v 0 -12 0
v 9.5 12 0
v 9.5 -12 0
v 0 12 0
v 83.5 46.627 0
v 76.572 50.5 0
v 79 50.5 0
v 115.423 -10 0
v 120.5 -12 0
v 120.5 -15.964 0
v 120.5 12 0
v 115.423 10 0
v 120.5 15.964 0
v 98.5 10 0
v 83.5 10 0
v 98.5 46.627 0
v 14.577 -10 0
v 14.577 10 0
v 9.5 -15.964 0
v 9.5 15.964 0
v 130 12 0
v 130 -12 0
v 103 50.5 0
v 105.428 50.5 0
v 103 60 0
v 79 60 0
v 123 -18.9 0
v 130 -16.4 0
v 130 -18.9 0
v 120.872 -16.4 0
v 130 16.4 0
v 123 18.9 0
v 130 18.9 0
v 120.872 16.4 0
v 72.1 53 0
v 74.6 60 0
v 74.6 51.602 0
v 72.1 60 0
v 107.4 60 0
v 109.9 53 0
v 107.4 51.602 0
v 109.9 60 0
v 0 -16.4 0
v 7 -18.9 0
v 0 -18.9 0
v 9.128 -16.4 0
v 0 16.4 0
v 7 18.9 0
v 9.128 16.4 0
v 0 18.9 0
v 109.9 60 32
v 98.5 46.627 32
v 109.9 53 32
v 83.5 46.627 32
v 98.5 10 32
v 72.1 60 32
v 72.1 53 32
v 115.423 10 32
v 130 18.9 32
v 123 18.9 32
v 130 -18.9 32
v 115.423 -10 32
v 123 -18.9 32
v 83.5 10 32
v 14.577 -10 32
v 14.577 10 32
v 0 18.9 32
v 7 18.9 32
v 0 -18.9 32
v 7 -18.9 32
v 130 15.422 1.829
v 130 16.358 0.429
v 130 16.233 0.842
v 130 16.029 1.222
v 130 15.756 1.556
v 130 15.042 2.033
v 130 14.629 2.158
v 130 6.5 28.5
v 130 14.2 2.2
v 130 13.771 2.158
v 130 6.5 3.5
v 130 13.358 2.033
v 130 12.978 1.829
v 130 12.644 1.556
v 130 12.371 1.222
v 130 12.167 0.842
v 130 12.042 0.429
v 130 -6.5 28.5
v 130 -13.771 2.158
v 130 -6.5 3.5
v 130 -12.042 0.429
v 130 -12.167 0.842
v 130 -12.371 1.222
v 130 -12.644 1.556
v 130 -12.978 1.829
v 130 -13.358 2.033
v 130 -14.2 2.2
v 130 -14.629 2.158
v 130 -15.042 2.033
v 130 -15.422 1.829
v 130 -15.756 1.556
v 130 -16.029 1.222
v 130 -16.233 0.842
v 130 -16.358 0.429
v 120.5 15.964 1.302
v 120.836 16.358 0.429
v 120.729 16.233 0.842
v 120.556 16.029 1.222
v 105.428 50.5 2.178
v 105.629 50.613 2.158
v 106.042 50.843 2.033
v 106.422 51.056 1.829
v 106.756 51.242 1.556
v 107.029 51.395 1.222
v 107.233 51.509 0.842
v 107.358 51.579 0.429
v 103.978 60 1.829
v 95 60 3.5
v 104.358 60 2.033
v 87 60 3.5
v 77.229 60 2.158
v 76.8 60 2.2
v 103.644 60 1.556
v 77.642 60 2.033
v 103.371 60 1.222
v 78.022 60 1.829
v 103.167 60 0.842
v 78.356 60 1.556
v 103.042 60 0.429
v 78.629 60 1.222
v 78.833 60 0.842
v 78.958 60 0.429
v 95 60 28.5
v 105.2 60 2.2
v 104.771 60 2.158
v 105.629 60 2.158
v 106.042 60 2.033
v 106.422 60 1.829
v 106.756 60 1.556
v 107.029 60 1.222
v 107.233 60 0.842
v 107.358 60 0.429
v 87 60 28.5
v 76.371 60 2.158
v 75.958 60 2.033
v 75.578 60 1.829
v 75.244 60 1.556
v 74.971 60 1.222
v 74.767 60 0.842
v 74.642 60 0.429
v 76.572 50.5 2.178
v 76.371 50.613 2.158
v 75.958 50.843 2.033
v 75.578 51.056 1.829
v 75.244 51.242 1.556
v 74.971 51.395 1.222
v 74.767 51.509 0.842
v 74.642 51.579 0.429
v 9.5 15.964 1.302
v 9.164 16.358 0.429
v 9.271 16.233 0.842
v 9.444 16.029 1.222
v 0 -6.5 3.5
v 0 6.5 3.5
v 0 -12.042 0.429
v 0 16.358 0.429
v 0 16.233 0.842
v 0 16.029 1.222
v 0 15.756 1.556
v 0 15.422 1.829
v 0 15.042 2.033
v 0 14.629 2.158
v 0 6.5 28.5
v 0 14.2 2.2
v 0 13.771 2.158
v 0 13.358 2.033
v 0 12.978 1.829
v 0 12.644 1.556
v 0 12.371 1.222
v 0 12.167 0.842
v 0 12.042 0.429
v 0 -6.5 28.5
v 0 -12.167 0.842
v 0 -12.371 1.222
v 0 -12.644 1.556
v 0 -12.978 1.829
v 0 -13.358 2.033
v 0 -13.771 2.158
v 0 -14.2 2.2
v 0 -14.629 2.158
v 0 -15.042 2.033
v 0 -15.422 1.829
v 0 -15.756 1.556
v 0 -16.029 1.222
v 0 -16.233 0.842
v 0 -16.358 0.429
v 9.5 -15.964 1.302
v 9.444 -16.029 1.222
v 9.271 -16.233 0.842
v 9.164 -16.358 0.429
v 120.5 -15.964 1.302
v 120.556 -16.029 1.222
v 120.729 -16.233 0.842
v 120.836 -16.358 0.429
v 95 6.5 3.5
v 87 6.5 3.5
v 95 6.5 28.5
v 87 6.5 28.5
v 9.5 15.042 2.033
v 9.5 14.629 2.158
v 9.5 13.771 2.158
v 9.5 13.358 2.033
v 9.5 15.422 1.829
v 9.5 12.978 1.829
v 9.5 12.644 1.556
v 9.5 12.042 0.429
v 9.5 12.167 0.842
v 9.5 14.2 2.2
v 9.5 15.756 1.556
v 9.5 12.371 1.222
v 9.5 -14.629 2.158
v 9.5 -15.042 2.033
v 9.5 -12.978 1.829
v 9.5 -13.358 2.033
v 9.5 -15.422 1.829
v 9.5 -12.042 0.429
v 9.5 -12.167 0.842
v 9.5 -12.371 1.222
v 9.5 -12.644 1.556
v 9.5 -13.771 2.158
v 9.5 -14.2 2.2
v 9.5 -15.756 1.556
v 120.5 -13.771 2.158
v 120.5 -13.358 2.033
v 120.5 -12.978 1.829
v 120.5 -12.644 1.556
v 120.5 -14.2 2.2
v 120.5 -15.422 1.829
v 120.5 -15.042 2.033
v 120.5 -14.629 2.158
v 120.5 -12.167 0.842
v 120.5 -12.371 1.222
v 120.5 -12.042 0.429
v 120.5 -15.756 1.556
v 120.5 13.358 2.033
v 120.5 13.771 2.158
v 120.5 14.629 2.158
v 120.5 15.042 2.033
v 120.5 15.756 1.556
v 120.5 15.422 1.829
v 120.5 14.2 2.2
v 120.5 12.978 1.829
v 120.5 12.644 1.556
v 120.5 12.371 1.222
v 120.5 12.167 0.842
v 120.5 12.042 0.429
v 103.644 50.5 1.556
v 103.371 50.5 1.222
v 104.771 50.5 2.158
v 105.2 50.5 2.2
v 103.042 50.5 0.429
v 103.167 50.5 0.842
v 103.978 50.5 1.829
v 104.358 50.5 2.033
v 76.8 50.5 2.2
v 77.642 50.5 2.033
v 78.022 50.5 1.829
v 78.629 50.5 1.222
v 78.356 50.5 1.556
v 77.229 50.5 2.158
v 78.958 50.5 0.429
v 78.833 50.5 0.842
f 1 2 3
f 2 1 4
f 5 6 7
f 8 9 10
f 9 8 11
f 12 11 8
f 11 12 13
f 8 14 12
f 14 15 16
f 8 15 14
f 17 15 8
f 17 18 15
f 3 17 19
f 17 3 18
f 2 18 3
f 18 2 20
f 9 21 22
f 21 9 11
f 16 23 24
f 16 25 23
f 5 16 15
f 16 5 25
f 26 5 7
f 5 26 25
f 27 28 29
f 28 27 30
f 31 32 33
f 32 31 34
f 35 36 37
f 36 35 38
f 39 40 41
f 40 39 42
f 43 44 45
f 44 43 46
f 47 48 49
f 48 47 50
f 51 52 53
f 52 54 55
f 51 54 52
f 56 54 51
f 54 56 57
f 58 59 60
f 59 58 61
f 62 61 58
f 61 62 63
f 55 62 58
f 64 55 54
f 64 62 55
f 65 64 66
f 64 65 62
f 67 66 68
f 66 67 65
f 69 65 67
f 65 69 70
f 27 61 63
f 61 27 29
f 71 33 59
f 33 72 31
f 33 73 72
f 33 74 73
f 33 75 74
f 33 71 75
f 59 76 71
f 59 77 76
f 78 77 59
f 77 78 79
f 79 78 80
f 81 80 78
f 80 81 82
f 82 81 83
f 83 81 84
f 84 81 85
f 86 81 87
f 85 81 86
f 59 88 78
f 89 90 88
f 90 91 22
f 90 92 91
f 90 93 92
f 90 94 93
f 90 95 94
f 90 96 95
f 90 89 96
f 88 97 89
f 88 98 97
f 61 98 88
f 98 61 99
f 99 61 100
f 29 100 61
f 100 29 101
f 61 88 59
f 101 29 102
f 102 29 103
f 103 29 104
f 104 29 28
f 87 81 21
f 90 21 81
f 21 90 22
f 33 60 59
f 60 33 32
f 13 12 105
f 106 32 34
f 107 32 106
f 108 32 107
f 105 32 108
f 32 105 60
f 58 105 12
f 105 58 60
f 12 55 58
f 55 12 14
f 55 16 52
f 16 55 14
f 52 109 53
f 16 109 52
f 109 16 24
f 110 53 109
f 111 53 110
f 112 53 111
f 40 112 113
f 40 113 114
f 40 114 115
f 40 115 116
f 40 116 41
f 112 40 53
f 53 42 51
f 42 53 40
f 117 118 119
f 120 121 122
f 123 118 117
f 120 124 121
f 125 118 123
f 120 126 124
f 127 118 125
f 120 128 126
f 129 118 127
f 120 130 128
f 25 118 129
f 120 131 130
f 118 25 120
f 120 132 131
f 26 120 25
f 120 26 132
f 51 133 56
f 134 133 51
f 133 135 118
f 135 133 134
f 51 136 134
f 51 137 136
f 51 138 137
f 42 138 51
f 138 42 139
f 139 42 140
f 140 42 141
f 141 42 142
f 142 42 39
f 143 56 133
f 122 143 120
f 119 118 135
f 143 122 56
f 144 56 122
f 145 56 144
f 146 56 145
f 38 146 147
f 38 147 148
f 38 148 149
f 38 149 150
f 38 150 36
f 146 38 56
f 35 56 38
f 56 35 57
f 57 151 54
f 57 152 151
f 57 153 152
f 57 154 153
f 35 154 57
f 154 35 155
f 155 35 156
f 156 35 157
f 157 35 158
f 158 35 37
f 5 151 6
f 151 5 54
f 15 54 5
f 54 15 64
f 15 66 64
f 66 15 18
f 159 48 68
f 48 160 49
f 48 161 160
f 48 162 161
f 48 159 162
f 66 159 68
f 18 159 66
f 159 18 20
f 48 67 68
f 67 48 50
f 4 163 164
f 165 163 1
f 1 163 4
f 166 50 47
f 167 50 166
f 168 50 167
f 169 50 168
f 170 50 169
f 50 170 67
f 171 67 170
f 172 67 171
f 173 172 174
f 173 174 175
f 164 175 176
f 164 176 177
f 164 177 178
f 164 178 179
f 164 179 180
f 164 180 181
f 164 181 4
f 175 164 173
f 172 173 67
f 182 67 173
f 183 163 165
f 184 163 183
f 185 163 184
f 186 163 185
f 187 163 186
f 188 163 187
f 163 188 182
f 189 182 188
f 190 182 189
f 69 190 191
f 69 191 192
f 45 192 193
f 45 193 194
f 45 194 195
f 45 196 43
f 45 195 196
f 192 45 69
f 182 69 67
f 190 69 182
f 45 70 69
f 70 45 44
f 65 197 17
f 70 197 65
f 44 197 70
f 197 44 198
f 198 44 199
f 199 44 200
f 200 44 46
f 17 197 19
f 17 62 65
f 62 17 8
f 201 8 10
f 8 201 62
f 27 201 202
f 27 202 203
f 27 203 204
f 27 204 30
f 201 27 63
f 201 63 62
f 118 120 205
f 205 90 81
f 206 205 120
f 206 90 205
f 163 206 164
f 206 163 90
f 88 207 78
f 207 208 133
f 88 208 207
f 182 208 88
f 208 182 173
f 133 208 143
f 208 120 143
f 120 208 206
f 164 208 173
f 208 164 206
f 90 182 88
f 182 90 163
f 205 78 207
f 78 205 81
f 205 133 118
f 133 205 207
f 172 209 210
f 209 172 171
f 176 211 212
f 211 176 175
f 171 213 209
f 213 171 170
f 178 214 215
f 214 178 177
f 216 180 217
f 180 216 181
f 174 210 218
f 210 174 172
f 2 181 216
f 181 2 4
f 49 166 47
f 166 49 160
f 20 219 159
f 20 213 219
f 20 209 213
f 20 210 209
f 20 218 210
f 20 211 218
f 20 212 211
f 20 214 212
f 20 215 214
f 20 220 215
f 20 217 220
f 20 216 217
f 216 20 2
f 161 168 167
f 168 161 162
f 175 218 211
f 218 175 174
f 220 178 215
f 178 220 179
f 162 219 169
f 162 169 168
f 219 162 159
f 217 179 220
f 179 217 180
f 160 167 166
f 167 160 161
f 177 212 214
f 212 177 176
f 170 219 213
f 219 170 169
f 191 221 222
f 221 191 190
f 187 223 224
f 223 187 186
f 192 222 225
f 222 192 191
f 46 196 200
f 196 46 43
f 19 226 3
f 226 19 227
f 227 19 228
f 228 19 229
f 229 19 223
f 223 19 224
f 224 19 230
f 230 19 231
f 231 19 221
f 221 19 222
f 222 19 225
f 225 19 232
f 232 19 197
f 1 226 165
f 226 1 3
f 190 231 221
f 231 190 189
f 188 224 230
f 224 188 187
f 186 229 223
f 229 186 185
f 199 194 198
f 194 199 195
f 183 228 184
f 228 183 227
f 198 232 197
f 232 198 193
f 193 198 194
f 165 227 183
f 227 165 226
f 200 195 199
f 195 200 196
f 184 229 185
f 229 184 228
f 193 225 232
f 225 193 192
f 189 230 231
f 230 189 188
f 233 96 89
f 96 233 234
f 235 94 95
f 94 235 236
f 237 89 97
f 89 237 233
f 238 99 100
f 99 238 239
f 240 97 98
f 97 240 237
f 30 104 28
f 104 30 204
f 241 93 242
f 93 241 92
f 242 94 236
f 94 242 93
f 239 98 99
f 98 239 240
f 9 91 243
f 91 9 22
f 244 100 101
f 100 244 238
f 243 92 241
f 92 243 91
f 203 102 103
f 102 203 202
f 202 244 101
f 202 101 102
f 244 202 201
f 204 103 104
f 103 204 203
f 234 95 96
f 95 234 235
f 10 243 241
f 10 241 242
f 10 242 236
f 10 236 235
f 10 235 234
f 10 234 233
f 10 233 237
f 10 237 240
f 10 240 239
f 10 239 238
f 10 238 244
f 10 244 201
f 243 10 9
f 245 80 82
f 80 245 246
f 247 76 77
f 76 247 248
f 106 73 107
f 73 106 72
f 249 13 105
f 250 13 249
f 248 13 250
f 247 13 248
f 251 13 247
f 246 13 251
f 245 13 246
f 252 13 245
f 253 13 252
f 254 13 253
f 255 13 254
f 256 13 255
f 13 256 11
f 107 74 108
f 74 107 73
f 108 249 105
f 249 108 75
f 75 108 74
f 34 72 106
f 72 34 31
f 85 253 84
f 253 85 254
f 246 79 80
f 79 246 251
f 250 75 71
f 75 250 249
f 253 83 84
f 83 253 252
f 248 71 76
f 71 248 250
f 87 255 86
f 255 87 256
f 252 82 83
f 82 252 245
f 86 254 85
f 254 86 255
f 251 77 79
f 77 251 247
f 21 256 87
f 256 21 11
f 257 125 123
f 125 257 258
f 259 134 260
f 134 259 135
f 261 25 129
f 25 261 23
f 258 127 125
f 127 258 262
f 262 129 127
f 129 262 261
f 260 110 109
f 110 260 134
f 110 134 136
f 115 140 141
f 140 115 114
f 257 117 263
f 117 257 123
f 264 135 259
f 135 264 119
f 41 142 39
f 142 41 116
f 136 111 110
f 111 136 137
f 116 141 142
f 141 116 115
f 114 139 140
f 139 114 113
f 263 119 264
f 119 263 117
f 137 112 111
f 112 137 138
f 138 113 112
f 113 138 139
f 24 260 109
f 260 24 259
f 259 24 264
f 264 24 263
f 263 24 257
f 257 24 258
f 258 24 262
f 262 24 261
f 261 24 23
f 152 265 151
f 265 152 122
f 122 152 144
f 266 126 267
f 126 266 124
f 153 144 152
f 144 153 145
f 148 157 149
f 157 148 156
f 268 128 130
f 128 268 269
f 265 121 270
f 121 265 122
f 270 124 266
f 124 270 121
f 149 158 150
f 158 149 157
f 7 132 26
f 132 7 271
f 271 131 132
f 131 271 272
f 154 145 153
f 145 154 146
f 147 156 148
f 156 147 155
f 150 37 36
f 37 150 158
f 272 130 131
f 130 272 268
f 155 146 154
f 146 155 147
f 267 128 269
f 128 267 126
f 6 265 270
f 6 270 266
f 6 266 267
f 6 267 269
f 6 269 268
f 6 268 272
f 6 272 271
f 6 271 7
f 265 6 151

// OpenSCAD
$fn = 32;

// ----------------------------------------------------------------------
// Air duct: 20 mm duct, 3.5 mm wall, 32 mm across
// ----------------------------------------------------------------------

// --- parameters (mm) ---
duct_r = 10;              // duct core radius
duct_d = 20;              // duct core diameter
wall = 3.5;               // duct wall thickness
height = 32;              // duct width (extrusion height)
port_r = 18.9;            // port flange half width
port_d = 37.8;            // port flange width
port_t = 7;               // port flange thickness
bolt_d = 4.4;             // port bolt holes
bolt_offset = 14.2;       // bolt hole offset from the port axis
branch_r = 7.5;           // branch core radius
branch_d = 15;            // branch core diameter
branch_len = 60;          // branch length from the run axis

difference() {
  /* outer hull chain: tube with a flat flange plate at every port */
  linear_extrude(height = 32) {
    hull() {
      polygon([[0, -18.9], [0, 18.9], [7, 18.9], [7, -18.9]]);
      translate([10, 0]) circle(r = 10);
    }
    hull() {
      translate([10, 0]) circle(r = 10);
      translate([39, 0]) circle(r = 10);
    }
    hull() {
      translate([39, 0]) circle(r = 10);
      translate([91, 0]) circle(r = 10);
    }
    hull() {
      translate([91, 0]) circle(r = 10);
      translate([120, 0]) circle(r = 10);
    }
    hull() {
      translate([120, 0]) circle(r = 10);
      polygon([[130, 18.9], [130, -18.9], [123, -18.9], [123, 18.9]]);
    }
    hull() {
      translate([91, 0]) circle(r = 7.5);
      translate([91, 33]) circle(r = 7.5);
    }
    hull() {
      translate([91, 33]) circle(r = 7.5);
      translate([91, 51]) circle(r = 7.5);
    }
    hull() {
      translate([91, 51]) circle(r = 7.5);
      polygon([[72.1, 60], [109.9, 60], [109.9, 53], [72.1, 53]]);
    }
  }
  /* air passage: the same chain inset by the wall, 5 mm proud of the ports */
  translate([0, 0, 3.5]) linear_extrude(height = 25) {
    hull() {
      translate([-5, 0]) circle(r = 6.5);
      translate([39, 0]) circle(r = 6.5);
    }
    hull() {
      translate([39, 0]) circle(r = 6.5);
      translate([91, 0]) circle(r = 6.5);
    }
    hull() {
      translate([91, 0]) circle(r = 6.5);
      translate([135, 0]) circle(r = 6.5);
    }
    hull() {
      translate([91, 0]) circle(r = 4);
      translate([91, 33]) circle(r = 4);
    }
    hull() {
      translate([91, 33]) circle(r = 4);
      translate([91, 65]) circle(r = 4);
    }
  }
  translate([0, 0]) rotate([0, 0, -90]) translate([-14.2, -2.5]) rotate([-90, 0, 0]) cylinder(h = 12, d = 4.4);
  translate([0, 0]) rotate([0, 0, -90]) translate([14.2, -2.5]) rotate([-90, 0, 0]) cylinder(h = 12, d = 4.4);
  translate([130, 0]) rotate([0, 0, 90]) translate([-14.2, -2.5]) rotate([-90, 0, 0]) cylinder(h = 12, d = 4.4);
  translate([130, 0]) rotate([0, 0, 90]) translate([14.2, -2.5]) rotate([-90, 0, 0]) cylinder(h = 12, d = 4.4);
  translate([91, 60]) rotate([0, 0, 180]) translate([-14.2, -2.5]) rotate([-90, 0, 0]) cylinder(h = 12, d = 4.4);
  translate([91, 60]) rotate([0, 0, 180]) translate([14.2, -2.5]) rotate([-90, 0, 0]) cylinder(h = 12, d = 4.4);
}
